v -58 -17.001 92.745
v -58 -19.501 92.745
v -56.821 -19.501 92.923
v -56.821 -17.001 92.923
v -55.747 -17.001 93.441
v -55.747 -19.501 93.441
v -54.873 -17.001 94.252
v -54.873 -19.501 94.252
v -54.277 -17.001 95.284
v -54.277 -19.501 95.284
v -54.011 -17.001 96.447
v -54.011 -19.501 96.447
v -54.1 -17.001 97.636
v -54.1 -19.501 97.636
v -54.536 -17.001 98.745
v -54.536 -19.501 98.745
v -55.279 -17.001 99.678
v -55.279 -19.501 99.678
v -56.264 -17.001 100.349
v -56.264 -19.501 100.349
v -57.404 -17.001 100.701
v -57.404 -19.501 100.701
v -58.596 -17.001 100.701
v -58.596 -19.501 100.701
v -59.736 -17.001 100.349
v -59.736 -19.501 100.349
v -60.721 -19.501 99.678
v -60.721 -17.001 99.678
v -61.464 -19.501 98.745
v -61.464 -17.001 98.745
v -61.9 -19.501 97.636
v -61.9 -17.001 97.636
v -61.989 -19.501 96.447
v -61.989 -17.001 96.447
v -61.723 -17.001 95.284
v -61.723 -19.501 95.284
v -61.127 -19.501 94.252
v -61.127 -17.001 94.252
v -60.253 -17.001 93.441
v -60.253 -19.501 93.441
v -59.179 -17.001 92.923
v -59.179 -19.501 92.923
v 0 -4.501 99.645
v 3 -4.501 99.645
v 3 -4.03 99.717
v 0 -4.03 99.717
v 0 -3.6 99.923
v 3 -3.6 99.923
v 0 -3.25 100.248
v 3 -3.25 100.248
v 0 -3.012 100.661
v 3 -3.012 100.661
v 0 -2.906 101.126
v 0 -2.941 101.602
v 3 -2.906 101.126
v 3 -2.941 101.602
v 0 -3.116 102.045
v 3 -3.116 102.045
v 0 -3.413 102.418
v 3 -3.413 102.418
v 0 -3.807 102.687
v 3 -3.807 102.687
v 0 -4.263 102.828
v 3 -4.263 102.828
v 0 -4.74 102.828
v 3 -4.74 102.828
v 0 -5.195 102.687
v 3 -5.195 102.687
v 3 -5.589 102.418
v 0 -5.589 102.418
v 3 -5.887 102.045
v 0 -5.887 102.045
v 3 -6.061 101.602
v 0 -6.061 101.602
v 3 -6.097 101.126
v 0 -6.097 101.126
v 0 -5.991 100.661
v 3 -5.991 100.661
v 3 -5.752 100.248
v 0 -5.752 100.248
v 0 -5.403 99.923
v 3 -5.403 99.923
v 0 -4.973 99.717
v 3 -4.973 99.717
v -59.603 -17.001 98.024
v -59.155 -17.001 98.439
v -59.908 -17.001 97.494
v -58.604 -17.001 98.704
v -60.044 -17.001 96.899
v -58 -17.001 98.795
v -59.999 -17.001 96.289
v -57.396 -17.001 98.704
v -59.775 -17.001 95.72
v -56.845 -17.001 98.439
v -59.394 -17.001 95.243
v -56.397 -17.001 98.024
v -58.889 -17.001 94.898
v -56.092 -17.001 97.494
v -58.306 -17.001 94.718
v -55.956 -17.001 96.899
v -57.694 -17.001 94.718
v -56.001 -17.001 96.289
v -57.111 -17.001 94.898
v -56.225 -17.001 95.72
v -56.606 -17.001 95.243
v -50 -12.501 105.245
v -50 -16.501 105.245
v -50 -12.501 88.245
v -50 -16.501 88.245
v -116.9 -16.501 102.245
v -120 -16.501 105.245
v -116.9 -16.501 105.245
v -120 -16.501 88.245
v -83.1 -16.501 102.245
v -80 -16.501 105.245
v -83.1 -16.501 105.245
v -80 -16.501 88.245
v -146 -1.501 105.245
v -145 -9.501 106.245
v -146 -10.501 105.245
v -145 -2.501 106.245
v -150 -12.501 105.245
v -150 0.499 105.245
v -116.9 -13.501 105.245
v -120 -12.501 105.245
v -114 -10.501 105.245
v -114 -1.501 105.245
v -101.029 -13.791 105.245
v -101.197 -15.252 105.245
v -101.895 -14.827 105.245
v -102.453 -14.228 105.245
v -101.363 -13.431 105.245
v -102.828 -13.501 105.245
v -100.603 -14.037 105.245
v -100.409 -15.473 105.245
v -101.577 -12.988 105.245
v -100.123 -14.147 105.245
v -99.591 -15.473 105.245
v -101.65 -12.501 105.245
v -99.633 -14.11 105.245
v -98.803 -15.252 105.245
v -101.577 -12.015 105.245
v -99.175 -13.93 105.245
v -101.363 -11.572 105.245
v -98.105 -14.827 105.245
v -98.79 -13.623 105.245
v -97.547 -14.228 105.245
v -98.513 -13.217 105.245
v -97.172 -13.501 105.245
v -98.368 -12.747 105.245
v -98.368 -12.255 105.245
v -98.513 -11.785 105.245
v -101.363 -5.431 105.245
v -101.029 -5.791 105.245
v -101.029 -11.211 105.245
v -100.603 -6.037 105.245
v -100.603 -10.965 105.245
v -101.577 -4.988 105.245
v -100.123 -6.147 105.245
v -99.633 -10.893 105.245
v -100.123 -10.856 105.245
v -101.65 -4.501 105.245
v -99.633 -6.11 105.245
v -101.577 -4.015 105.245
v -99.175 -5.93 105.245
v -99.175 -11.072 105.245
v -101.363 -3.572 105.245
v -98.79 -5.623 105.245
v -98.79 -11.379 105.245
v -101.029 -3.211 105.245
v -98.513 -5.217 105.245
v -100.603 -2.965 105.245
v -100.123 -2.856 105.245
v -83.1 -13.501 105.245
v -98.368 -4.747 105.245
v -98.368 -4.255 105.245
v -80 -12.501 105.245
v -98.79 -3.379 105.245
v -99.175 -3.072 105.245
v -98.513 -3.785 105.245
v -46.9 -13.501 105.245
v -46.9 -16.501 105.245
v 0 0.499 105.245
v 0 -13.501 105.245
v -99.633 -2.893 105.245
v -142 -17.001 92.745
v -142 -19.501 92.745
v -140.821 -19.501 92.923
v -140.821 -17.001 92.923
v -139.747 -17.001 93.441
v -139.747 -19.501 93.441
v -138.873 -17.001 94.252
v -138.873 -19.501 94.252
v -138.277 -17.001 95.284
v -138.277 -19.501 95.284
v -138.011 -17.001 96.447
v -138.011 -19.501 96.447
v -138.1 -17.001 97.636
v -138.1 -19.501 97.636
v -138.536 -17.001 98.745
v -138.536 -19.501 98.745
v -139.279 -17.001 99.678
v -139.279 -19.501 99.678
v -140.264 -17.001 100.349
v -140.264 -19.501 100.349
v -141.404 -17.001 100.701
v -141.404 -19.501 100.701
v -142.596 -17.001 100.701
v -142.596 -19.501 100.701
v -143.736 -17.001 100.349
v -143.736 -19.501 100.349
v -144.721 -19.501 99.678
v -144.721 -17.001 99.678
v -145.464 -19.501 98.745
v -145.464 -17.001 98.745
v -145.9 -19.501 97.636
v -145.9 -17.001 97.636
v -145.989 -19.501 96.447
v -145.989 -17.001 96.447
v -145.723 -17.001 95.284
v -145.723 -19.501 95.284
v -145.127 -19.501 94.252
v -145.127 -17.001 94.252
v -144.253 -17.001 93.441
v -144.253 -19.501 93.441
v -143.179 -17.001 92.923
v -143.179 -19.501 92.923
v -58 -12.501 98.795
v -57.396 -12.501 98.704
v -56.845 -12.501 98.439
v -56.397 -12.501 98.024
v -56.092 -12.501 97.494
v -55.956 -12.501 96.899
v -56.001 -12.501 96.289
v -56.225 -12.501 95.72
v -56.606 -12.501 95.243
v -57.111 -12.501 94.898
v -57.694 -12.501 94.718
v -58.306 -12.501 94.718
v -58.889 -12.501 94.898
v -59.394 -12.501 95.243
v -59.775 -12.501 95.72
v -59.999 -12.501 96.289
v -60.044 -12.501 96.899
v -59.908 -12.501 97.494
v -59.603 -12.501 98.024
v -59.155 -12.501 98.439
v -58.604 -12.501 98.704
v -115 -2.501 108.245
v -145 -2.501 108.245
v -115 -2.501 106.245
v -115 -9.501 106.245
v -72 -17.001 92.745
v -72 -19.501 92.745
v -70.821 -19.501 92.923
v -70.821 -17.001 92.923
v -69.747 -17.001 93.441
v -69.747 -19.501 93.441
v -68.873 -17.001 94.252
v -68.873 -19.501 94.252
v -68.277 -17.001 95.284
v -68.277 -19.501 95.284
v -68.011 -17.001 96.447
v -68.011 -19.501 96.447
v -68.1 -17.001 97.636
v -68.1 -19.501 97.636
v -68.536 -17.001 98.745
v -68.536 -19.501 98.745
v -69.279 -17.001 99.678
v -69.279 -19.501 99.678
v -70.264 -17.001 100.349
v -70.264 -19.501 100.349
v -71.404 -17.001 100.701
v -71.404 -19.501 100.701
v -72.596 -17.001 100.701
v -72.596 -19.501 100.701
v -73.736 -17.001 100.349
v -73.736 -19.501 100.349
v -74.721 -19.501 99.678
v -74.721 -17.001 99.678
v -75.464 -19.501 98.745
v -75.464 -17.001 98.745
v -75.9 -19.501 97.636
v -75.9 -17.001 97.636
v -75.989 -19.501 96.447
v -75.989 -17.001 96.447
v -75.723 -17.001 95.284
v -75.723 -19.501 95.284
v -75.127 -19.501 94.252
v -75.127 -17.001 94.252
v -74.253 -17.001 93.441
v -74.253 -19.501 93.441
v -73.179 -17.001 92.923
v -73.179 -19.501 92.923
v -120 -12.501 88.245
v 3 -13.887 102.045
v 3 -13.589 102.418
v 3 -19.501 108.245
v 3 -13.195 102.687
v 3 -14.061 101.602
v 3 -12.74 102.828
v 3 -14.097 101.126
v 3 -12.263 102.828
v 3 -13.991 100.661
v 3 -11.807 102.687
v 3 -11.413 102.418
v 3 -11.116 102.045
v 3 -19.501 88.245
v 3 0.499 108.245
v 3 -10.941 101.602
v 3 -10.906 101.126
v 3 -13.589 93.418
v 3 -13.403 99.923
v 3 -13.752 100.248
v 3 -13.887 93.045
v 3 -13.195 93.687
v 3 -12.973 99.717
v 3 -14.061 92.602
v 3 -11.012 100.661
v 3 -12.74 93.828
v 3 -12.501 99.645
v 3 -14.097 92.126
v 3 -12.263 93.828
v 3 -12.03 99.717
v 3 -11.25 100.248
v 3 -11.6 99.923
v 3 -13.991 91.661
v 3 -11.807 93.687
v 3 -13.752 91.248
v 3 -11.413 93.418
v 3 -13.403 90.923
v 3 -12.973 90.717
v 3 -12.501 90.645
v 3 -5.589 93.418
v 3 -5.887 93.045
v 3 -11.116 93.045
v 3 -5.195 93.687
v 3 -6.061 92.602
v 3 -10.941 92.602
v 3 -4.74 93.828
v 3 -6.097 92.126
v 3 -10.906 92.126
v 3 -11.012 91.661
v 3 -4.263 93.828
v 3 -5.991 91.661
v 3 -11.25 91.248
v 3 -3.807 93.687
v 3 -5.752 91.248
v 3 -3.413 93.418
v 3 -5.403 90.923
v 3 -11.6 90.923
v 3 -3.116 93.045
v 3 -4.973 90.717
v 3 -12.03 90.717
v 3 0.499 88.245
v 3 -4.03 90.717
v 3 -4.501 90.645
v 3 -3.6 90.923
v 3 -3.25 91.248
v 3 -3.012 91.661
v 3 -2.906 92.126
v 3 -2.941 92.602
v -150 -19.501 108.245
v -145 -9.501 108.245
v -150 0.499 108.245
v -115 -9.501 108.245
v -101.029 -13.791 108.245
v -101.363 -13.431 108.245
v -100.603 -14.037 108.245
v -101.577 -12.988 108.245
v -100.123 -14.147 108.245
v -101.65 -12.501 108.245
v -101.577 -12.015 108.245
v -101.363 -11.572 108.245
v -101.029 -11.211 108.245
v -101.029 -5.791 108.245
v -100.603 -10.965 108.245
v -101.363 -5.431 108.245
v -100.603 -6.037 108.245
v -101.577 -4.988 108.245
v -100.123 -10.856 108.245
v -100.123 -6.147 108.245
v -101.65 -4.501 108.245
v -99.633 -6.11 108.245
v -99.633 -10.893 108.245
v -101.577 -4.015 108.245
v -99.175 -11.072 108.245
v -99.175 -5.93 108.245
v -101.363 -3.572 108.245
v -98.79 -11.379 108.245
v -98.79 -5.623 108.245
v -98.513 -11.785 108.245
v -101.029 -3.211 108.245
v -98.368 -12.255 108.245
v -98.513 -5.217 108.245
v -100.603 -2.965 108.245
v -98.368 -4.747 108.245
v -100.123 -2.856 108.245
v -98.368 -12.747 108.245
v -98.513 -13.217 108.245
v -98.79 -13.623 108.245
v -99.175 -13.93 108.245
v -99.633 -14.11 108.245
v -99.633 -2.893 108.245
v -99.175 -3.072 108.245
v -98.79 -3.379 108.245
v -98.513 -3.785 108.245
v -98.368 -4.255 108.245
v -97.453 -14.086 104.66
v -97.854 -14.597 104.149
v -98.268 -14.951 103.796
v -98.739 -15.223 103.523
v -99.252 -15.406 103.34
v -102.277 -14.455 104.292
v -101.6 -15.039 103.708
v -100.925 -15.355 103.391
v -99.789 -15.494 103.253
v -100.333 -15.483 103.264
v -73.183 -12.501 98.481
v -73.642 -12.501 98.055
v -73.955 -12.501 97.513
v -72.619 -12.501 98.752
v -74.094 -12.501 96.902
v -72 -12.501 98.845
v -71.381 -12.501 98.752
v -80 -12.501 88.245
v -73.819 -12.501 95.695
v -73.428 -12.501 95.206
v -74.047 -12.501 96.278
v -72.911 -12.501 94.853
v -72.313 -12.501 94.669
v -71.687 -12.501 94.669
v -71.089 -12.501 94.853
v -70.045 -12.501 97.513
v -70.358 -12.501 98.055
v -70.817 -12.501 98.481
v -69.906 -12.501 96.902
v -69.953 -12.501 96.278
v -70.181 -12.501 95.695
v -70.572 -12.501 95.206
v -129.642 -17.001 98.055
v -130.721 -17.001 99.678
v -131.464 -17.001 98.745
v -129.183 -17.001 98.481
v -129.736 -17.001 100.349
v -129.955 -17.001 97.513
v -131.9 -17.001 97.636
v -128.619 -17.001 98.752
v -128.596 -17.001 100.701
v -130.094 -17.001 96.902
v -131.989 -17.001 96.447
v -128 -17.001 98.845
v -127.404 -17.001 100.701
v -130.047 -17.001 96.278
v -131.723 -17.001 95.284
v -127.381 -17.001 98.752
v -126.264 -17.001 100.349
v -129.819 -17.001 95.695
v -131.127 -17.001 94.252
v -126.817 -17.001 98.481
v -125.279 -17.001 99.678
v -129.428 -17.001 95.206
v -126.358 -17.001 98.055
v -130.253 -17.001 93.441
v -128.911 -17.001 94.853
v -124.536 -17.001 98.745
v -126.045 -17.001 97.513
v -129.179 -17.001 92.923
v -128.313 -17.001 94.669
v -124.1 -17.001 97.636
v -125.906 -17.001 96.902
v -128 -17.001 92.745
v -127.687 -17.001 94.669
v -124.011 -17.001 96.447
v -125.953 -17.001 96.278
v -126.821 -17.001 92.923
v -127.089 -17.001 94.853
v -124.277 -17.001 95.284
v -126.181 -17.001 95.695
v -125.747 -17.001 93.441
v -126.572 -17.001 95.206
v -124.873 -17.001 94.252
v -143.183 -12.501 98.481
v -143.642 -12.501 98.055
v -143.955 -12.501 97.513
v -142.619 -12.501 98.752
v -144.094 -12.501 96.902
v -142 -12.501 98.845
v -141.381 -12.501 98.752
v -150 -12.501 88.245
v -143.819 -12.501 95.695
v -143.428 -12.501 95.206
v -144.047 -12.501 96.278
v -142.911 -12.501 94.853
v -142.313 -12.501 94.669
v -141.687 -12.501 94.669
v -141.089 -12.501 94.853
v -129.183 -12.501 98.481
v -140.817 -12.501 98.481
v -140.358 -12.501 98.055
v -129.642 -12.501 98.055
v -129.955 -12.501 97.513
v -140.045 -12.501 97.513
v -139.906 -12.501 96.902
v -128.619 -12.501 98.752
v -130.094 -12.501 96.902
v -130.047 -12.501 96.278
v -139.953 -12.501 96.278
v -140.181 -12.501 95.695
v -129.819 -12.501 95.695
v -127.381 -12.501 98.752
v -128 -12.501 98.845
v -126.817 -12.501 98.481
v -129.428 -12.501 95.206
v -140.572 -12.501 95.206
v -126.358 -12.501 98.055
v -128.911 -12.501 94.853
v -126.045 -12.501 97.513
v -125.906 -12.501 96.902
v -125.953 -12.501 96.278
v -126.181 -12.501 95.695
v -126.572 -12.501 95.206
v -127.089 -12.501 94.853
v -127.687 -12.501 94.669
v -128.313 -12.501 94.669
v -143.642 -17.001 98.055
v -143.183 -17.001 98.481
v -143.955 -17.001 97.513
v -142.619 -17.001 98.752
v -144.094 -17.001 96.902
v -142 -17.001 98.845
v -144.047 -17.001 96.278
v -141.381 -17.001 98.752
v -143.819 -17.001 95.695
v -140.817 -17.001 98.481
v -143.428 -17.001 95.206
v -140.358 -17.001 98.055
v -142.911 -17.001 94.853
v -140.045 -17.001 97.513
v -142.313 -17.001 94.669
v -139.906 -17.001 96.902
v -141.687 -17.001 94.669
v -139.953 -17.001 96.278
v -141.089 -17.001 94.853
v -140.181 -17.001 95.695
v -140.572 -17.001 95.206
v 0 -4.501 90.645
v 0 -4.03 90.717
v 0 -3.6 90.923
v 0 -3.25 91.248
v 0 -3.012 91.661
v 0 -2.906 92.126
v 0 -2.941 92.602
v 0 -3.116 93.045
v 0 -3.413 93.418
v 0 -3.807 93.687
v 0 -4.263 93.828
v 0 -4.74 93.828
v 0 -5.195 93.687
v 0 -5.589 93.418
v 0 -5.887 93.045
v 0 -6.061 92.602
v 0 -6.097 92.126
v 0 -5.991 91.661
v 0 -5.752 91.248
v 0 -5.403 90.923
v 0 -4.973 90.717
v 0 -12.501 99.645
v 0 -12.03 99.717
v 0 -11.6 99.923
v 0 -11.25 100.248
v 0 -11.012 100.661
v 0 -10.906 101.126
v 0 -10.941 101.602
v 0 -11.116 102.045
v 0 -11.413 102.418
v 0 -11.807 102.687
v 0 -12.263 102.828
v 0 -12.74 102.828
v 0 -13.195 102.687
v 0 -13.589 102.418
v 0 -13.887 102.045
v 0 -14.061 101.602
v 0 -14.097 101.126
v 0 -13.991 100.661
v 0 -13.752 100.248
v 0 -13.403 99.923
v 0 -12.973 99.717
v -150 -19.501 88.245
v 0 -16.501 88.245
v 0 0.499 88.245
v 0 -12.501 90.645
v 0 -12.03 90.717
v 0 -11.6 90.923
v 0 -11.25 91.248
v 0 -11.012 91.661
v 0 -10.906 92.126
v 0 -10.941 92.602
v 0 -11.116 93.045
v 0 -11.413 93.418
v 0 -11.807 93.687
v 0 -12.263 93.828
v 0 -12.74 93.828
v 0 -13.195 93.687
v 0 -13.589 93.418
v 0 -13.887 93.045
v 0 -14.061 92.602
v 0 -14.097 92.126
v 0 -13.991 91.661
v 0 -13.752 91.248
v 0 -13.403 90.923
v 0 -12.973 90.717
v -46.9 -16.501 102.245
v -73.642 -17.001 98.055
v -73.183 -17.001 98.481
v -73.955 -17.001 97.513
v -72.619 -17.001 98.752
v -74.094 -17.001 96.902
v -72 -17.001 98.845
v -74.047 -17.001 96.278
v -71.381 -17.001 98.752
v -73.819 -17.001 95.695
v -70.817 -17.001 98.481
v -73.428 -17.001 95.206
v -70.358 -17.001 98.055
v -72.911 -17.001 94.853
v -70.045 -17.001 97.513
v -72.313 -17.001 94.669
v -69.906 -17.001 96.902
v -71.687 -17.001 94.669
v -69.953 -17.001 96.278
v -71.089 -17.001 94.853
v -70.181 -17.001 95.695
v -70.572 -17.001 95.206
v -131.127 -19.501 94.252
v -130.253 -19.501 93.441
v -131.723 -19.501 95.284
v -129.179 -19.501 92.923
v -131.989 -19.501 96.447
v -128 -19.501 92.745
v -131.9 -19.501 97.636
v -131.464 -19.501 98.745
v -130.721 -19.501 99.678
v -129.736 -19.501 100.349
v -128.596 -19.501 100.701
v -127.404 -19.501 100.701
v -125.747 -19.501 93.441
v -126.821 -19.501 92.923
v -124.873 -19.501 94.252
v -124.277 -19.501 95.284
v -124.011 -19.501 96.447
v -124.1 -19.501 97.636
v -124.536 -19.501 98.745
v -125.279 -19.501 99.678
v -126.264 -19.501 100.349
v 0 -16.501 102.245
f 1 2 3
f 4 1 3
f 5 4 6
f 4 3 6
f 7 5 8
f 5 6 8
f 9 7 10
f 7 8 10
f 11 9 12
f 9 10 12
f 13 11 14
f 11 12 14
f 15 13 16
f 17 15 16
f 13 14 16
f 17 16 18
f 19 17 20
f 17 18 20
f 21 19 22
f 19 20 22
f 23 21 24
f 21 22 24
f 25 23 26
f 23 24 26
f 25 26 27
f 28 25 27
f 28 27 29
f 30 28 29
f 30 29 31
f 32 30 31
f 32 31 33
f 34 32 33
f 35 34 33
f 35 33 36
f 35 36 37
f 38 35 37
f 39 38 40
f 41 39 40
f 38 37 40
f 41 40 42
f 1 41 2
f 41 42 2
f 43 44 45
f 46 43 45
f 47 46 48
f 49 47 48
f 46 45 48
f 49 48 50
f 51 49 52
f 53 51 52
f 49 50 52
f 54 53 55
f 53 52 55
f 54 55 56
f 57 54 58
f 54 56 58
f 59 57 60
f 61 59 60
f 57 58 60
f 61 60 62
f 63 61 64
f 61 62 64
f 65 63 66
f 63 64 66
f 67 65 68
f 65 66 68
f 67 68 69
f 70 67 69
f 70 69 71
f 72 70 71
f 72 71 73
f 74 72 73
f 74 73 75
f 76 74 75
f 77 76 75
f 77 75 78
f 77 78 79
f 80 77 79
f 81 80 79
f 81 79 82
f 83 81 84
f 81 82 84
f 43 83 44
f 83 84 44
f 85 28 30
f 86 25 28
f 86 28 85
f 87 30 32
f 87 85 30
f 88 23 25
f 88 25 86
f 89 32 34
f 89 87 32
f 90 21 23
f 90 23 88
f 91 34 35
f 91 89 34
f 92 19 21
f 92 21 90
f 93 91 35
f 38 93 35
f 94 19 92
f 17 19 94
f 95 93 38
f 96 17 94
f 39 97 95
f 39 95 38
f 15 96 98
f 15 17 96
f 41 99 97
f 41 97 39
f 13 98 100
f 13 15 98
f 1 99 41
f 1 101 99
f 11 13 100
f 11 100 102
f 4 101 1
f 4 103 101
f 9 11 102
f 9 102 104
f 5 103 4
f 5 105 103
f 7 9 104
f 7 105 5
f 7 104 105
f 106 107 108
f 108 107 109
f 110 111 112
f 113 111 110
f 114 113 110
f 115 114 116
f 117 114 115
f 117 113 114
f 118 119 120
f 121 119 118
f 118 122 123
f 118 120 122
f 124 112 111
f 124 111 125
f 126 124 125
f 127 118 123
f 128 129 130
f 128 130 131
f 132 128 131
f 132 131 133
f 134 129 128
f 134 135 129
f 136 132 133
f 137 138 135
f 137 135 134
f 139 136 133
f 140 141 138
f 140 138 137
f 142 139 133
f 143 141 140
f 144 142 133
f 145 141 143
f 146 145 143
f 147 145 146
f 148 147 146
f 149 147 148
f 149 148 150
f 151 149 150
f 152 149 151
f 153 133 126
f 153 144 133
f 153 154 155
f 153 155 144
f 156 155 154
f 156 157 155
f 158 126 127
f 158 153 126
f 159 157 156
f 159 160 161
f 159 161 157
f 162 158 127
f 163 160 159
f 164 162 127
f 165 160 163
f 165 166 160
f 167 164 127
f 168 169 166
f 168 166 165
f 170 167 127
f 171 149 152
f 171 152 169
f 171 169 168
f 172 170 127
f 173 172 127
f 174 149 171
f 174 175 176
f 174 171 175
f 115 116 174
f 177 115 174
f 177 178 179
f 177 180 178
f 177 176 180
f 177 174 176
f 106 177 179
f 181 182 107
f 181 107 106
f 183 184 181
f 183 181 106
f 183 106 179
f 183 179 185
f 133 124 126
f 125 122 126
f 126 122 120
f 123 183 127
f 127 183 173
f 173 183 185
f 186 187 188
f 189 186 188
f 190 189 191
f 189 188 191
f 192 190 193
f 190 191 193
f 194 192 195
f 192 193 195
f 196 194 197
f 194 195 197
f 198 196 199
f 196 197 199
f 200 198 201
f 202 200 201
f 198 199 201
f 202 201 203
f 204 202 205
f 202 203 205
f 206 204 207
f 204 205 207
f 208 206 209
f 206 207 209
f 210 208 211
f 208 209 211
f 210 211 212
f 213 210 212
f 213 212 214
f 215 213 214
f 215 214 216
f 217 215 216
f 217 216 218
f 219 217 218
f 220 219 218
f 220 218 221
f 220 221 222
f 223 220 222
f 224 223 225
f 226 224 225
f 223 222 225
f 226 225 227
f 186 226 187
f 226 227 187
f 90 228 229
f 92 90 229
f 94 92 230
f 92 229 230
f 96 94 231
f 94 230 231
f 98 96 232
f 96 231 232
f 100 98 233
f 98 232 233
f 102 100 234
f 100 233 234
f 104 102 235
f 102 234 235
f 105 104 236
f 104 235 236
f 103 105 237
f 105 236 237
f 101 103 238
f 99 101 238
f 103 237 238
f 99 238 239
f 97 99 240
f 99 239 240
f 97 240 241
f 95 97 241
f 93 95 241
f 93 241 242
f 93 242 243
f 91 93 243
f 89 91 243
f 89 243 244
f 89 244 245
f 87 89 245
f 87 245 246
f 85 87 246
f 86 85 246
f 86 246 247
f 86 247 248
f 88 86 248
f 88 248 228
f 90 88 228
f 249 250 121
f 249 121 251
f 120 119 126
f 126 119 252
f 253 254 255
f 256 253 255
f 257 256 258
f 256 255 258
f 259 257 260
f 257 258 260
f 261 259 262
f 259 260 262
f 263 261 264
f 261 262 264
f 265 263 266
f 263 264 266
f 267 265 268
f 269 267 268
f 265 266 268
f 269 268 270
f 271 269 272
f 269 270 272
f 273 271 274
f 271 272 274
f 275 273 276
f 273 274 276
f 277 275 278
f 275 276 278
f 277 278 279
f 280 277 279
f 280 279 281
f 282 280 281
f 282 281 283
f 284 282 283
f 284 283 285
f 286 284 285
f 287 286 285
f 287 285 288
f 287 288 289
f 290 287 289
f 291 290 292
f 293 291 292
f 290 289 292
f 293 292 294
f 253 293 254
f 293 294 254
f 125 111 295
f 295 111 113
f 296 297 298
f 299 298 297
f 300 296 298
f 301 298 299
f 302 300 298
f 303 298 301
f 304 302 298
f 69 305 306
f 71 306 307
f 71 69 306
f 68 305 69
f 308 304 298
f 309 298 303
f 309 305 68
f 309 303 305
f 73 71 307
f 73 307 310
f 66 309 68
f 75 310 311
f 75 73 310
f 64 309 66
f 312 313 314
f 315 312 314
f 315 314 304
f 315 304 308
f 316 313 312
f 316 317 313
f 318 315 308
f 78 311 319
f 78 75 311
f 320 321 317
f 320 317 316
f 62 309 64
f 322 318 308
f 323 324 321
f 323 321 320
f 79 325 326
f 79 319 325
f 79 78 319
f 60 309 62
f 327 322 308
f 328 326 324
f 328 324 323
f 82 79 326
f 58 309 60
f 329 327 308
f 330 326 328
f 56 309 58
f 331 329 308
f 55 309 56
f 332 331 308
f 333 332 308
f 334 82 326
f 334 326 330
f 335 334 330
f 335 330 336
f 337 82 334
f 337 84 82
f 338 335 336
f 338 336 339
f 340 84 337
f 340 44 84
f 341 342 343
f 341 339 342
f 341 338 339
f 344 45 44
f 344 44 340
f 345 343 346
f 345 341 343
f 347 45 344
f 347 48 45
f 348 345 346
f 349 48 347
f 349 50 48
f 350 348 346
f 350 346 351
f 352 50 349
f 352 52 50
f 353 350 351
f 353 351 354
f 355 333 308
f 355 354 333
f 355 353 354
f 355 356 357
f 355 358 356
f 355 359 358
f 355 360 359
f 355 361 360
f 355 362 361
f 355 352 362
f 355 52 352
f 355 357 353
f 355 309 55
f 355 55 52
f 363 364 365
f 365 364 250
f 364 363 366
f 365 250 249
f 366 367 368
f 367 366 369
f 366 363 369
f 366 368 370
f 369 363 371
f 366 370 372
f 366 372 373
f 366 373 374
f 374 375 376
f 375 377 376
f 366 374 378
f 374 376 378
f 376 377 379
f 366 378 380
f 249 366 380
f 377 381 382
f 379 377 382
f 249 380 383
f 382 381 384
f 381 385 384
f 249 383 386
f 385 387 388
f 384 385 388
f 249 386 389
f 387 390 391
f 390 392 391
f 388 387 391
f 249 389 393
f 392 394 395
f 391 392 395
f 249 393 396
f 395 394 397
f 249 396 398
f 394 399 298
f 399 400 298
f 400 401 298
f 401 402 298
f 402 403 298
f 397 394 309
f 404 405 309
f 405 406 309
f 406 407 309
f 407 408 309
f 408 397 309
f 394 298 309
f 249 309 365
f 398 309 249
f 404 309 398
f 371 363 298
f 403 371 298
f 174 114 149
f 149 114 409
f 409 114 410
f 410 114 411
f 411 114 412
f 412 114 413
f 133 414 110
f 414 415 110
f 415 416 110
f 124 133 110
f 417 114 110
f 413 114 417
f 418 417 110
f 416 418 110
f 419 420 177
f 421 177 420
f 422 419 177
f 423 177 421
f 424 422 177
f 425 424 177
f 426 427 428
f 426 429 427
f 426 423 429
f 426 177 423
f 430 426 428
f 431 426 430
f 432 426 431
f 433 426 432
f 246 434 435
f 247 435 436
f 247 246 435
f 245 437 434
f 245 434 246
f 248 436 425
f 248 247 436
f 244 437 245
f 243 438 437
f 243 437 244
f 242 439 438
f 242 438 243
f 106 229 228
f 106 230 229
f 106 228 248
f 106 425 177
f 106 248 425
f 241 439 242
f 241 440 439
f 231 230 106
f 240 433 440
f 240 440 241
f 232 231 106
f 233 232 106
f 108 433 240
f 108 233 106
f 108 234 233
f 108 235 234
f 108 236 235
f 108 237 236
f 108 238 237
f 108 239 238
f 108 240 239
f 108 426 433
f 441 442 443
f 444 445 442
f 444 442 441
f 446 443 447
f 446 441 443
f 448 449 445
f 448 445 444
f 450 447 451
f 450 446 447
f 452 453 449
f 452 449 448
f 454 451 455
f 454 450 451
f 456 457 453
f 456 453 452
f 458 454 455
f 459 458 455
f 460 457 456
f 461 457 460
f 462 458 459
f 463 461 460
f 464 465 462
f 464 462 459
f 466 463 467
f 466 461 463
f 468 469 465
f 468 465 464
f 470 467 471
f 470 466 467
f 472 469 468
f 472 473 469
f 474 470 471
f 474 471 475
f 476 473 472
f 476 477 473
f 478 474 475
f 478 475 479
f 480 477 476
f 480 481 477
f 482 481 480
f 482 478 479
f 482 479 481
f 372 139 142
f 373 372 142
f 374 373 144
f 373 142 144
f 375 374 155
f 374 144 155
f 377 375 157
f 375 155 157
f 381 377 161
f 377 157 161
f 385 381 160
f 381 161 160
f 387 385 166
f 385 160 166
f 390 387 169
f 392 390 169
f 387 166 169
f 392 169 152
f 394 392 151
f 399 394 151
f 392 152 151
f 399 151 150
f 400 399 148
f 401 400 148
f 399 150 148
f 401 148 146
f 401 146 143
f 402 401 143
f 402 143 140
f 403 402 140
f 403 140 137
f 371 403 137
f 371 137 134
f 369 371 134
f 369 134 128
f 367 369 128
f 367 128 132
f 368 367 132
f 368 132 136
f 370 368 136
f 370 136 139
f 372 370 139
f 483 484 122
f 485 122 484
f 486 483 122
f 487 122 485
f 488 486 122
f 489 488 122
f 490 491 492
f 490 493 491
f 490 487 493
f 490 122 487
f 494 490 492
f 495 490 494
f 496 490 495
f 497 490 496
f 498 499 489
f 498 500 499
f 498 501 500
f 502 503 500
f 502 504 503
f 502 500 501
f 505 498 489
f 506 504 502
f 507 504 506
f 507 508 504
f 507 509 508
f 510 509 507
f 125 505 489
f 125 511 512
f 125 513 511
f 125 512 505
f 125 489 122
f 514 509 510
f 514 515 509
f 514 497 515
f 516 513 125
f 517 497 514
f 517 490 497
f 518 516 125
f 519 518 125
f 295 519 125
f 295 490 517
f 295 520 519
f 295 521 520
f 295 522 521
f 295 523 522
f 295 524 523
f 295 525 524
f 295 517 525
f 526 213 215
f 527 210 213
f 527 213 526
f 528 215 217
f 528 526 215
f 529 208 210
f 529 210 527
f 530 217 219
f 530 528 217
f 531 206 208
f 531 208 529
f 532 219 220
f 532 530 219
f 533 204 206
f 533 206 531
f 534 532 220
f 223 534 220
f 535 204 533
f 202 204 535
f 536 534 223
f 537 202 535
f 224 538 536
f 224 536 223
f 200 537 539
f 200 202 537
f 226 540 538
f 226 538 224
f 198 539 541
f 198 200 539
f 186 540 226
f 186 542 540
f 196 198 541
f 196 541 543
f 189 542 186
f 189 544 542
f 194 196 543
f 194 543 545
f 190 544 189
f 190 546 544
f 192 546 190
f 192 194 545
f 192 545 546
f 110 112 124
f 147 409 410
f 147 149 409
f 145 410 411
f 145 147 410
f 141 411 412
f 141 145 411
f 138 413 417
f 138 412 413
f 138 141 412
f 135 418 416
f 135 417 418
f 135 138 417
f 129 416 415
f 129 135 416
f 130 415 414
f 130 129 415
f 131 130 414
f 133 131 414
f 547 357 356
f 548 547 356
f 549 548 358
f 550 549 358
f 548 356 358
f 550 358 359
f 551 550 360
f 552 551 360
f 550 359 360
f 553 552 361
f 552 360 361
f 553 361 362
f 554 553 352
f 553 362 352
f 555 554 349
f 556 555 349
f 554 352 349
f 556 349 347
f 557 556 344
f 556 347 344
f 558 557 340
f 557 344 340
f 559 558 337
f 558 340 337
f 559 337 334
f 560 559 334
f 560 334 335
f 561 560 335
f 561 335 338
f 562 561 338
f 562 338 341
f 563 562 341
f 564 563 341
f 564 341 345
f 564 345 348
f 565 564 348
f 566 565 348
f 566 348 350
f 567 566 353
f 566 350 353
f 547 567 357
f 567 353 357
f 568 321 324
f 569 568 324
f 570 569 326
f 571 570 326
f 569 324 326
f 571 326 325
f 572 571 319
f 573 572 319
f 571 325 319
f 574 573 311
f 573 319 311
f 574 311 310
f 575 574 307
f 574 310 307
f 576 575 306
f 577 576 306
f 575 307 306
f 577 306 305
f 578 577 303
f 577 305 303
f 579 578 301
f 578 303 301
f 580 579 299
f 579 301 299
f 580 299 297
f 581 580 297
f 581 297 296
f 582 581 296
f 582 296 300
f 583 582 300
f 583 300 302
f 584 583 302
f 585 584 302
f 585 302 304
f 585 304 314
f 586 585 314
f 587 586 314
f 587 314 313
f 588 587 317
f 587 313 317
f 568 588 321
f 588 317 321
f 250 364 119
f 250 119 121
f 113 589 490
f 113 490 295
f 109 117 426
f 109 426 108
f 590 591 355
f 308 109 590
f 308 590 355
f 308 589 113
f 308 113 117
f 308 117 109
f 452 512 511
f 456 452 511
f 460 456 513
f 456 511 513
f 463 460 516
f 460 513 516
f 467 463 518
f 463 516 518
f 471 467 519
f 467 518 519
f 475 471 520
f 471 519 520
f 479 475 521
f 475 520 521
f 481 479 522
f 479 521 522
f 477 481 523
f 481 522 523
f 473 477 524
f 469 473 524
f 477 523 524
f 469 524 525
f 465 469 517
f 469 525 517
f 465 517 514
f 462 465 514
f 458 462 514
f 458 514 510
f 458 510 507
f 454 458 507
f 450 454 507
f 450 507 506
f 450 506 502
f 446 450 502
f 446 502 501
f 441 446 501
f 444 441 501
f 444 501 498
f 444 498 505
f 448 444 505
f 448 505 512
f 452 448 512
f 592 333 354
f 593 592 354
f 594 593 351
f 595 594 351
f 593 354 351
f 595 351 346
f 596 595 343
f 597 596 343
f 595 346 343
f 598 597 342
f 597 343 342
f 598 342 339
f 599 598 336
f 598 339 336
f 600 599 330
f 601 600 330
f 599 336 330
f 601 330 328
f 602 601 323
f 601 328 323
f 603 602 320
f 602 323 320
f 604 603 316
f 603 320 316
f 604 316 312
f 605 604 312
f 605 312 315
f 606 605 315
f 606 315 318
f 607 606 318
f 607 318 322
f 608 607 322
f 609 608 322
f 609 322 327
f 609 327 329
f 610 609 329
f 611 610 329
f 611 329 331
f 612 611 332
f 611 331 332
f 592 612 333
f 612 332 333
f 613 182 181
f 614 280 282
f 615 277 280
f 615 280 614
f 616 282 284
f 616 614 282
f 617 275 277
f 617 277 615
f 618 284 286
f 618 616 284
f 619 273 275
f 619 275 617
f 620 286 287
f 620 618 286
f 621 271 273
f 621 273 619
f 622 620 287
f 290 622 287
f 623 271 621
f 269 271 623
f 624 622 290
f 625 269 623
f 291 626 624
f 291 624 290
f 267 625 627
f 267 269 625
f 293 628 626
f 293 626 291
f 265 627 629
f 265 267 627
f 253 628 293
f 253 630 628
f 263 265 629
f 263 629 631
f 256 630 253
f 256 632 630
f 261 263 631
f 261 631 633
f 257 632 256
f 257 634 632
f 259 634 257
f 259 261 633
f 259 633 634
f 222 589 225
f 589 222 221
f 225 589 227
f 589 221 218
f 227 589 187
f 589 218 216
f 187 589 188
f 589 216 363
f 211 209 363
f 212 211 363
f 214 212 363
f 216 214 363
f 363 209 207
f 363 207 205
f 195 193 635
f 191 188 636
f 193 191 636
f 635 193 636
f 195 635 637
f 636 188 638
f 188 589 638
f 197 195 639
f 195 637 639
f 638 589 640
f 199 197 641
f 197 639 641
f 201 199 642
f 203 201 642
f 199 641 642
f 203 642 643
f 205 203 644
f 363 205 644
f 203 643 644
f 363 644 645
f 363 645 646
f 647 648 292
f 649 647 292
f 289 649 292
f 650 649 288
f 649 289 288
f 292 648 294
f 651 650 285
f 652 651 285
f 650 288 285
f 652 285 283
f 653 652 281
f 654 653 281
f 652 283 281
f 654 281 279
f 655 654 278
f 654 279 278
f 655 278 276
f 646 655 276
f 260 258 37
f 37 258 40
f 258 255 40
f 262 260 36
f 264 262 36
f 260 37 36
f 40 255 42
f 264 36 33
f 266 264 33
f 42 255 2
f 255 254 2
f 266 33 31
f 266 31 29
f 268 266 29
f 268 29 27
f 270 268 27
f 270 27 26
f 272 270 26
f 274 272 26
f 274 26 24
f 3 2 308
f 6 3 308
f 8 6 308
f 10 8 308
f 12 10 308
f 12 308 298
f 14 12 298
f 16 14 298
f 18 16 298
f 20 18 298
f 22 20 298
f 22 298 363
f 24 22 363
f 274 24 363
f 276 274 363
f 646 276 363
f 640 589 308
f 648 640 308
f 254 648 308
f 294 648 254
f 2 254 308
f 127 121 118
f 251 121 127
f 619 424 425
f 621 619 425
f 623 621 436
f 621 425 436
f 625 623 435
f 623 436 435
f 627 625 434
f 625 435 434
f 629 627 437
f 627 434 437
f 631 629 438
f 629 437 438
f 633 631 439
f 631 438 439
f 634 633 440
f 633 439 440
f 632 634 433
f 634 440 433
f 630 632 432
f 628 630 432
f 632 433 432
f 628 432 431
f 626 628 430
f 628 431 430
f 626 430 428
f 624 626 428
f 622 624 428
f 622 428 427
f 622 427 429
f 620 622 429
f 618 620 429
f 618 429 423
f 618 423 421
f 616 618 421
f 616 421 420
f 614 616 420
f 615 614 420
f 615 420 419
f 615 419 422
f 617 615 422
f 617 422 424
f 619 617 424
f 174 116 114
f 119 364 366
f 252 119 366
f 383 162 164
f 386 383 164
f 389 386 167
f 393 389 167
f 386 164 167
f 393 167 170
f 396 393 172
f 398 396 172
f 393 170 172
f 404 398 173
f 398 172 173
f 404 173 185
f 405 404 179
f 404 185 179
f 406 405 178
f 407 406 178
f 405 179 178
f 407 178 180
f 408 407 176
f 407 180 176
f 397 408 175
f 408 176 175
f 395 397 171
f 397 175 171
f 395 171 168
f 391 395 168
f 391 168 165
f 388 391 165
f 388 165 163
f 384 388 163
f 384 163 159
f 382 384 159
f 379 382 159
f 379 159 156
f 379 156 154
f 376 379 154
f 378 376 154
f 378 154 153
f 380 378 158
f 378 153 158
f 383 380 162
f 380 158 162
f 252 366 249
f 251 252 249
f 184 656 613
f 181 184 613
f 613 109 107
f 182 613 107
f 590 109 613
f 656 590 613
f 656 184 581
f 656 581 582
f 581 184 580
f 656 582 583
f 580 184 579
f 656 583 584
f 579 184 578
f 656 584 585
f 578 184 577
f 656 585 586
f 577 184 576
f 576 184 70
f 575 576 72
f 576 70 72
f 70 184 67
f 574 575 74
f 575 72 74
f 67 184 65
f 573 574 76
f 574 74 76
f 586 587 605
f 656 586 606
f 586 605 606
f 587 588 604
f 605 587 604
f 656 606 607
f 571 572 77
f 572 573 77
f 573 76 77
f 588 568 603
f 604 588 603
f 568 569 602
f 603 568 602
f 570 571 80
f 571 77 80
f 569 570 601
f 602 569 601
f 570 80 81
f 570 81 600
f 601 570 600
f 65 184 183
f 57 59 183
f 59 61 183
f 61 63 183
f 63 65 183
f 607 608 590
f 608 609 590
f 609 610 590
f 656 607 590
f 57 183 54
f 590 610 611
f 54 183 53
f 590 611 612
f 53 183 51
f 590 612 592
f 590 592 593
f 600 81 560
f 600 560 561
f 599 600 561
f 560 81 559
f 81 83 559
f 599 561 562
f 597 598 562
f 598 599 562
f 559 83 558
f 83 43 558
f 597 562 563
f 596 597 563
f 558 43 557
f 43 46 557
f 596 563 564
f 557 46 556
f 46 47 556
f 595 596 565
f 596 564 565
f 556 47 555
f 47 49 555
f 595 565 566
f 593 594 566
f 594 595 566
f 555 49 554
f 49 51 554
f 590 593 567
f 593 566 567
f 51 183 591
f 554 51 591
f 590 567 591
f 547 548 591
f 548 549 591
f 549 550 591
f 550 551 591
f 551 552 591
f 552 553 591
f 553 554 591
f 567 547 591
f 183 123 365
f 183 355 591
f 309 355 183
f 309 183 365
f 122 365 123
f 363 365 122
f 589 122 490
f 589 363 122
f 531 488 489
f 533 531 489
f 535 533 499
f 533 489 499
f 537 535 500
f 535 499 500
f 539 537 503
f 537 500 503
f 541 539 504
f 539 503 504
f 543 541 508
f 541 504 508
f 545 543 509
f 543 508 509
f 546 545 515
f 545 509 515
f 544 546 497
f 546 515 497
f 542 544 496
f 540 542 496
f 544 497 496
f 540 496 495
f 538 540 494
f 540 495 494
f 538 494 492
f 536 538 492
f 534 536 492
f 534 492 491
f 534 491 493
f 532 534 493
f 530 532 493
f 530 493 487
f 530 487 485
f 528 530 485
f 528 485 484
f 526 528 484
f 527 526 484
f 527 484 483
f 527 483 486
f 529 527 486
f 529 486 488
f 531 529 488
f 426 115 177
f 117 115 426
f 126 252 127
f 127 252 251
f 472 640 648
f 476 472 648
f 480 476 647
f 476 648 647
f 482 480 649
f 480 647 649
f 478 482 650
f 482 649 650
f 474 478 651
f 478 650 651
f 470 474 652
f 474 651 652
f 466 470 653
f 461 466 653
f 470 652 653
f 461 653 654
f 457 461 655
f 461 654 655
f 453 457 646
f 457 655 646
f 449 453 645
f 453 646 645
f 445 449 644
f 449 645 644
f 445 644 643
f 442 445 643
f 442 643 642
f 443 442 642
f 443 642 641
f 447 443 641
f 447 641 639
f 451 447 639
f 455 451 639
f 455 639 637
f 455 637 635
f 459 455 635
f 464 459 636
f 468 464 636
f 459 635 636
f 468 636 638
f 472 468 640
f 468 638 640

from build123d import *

# Parameters (mm, degrees)
SKETCH1_W           = 20
SKETCH1_H           = 20
BOSS_EXTRUDE1_DEPTH = 3
SKETCH2_W           = 3
SKETCH2_H           = 20
BOSS_EXTRUDE2_DEPTH = 150
SKETCH3_W           = 17
SKETCH3_H           = 3
BOSS_EXTRUDE3_DEPTH = 150
SKETCH4_R           = 1.6
CUT_EXTRUDE1_DEPTH  = 3
SKETCH5_W           = 30
SKETCH5_H           = 17
BOSS_EXTRUDE4_DEPTH = 4
SKETCH6_W           = 30
SKETCH6_H           = 17
BOSS_EXTRUDE5_DEPTH = 4
SKETCH9_R           = 2.05
SKETCH9_R_2         = 2.1
CUT_EXTRUDE4_DEPTH  = 186.434844337
SKETCH10_R          = 4
CUT_EXTRUDE5_DEPTH  = 2.5
SKETCH11_W          = 30
SKETCH11_H          = 7
CUT_EXTRUDE6_DEPTH  = 3
CHAMFER2_SIZE       = 1
CHAMFER3_SIZE       = 3
SKETCH12_W          = 3.1
SKETCH12_H          = 17
CUT_EXTRUDE7_DEPTH  = 3
SKETCH13_R          = 1.65
CUT_EXTRUDE8_DEPTH  = 3
SKETCH14_R          = 3
CUT_EXTRUDE9_DEPTH  = 6


with BuildPart() as part:
    # Sketch1 → Boss-Extrude1 (new body)
    with BuildSketch(Plane(origin=(0, 0, 0), x_dir=(0, 0, -1), z_dir=(1, 0, 0))):
        with Locations((-98.245468701, -9.501201475)):
            Rectangle(SKETCH1_W, SKETCH1_H)
    extrude(amount=BOSS_EXTRUDE1_DEPTH)

    # Sketch2 → Boss-Extrude2 (add)
    with BuildSketch(Plane.ZY):
        with Locations((106.745468701, -9.501201475)):
            Rectangle(SKETCH2_W, SKETCH2_H)
    extrude(amount=BOSS_EXTRUDE2_DEPTH)

    # Sketch3 → Boss-Extrude3 (add)
    with BuildSketch(Plane.ZY):
        with Locations((96.745468701, -18.001201475)):
            Rectangle(SKETCH3_W, SKETCH3_H)
    extrude(amount=BOSS_EXTRUDE3_DEPTH)

    # Sketch4 → Cut-Extrude1 (cut)
    with BuildSketch(Plane(origin=(3, 0, 0), x_dir=(0, 0, -1), z_dir=(1, 0, 0))):
        with Locations((-101.245468701, -4.501201475)):
            Circle(SKETCH4_R)
        with Locations((-92.245468701, -4.501201475)):
            Circle(SKETCH4_R)
        with Locations((-92.245468701, -12.501201475)):
            Circle(SKETCH4_R)
        with Locations((-101.245468701, -12.501201475)):
            Circle(SKETCH4_R)
    extrude(amount=-CUT_EXTRUDE1_DEPTH, mode=Mode.SUBTRACT)

    # Sketch5 → Boss-Extrude4 (add)
    with BuildSketch(Plane(origin=(0, -16.501201475, 0), x_dir=(1, 0, 0), z_dir=(0, 1, 0))):
        with Locations((-135, -96.745468701)):
            Rectangle(SKETCH5_W, SKETCH5_H)
    extrude(amount=BOSS_EXTRUDE4_DEPTH)

    # Sketch6 → Boss-Extrude5 (add)
    with BuildSketch(Plane(origin=(0, -16.501201475, 0), x_dir=(1, 0, 0), z_dir=(0, 1, 0))):
        with Locations((-65, -96.745468701)):
            Rectangle(SKETCH6_W, SKETCH6_H)
    extrude(amount=BOSS_EXTRUDE5_DEPTH)

    # Sketch9 → Cut-Extrude4 (cut, through all)
    with BuildSketch(Plane(origin=(0, -12.501201475, 0), x_dir=(1, 0, 0), z_dir=(0, 1, 0))):
        with Locations(Location((-58, -96.745468701, 0), (0, 0, 270))):
            Circle(SKETCH9_R)
        with Locations(Location((-72, -96.745468701, 0), (0, 0, 270))):
            Circle(SKETCH9_R_2)
        with Locations(Location((-128, -96.745468701, 0), (0, 0, 270))):
            Circle(SKETCH9_R_2)
        with Locations(Location((-142, -96.745468701, 0), (0, 0, 270))):
            Circle(SKETCH9_R_2)
    extrude(amount=-CUT_EXTRUDE4_DEPTH, mode=Mode.SUBTRACT)

    # Sketch10 → Cut-Extrude5 (cut)
    with BuildSketch(Plane.XZ.offset(19.501201475)):
        with Locations(Location((-142, 96.745468701, 0), (0, 0, 270))):
            Circle(SKETCH10_R)
        with Locations(Location((-128, 96.745468701, 0), (0, 0, 270))):
            Circle(SKETCH10_R)
        with Locations(Location((-72, 96.745468701, 0), (0, 0, 270))):
            Circle(SKETCH10_R)
        with Locations(Location((-58, 96.745468701, 0), (0, 0, 270))):
            Circle(SKETCH10_R)
    extrude(amount=-CUT_EXTRUDE5_DEPTH, mode=Mode.SUBTRACT)

    # Sketch11 → Cut-Extrude6 (cut)
    with BuildSketch(Plane.XY.offset(108.245468701)):
        with Locations((-130, -6.001201475)):
            Rectangle(SKETCH11_W, SKETCH11_H)
    extrude(amount=-CUT_EXTRUDE6_DEPTH, mode=Mode.SUBTRACT)

    # Chamfer2
    chamfer2_edges = [part.edges().sort_by_distance(p)[0] for p in [
        (-145, -6.001201475, 105.245468701),
        (-130, -2.501201475, 105.245468701),
        (-115, -6.001201475, 105.245468701),
        (-130, -9.501201475, 105.245468701),
    ]]
    chamfer(chamfer2_edges, length=CHAMFER2_SIZE)

    # Chamfer3
    chamfer3_edges = [part.edges().sort_by_distance(p)[0] for p in [
        (-100, -16.501201475, 105.245468701),
        (-25, -16.501201475, 105.245468701),
    ]]
    chamfer(chamfer3_edges, length=CHAMFER3_SIZE)

    # Sketch12 → Cut-Extrude7 (cut)
    with BuildSketch(Plane(origin=(0, -16.501201475, 0), x_dir=(1, 0, 0), z_dir=(0, 1, 0))):
        with Locations((-118.45, -96.745468701)):
            Rectangle(SKETCH12_W, SKETCH12_H)
        with Locations((-81.55, -96.745468701)):
            Rectangle(SKETCH12_W, SKETCH12_H)
        with Locations((-48.45, -96.745468701)):
            Rectangle(SKETCH12_W, SKETCH12_H)
    extrude(amount=CUT_EXTRUDE7_DEPTH, mode=Mode.SUBTRACT)

    # Sketch13 → Cut-Extrude8 (cut)
    with BuildSketch(Plane(origin=(0, 0, 105.245468701), x_dir=(-1, 0, 0), z_dir=(0, 0, -1))):
        with Locations((100, -4.501201475)):
            Circle(SKETCH13_R)
        with Locations((100, -12.501201475)):
            Circle(SKETCH13_R)
    extrude(amount=-CUT_EXTRUDE8_DEPTH, mode=Mode.SUBTRACT)

    # Sketch14 → Cut-Extrude9 (cut)
    with BuildSketch(Plane(origin=(0, 0, 105.245468701), x_dir=(-1, 0, 0), z_dir=(0, 0, -1))):
        with Locations((100, -12.501201475)):
            Circle(SKETCH14_R)
    extrude(amount=CUT_EXTRUDE9_DEPTH, mode=Mode.SUBTRACT)


solid = part.part
